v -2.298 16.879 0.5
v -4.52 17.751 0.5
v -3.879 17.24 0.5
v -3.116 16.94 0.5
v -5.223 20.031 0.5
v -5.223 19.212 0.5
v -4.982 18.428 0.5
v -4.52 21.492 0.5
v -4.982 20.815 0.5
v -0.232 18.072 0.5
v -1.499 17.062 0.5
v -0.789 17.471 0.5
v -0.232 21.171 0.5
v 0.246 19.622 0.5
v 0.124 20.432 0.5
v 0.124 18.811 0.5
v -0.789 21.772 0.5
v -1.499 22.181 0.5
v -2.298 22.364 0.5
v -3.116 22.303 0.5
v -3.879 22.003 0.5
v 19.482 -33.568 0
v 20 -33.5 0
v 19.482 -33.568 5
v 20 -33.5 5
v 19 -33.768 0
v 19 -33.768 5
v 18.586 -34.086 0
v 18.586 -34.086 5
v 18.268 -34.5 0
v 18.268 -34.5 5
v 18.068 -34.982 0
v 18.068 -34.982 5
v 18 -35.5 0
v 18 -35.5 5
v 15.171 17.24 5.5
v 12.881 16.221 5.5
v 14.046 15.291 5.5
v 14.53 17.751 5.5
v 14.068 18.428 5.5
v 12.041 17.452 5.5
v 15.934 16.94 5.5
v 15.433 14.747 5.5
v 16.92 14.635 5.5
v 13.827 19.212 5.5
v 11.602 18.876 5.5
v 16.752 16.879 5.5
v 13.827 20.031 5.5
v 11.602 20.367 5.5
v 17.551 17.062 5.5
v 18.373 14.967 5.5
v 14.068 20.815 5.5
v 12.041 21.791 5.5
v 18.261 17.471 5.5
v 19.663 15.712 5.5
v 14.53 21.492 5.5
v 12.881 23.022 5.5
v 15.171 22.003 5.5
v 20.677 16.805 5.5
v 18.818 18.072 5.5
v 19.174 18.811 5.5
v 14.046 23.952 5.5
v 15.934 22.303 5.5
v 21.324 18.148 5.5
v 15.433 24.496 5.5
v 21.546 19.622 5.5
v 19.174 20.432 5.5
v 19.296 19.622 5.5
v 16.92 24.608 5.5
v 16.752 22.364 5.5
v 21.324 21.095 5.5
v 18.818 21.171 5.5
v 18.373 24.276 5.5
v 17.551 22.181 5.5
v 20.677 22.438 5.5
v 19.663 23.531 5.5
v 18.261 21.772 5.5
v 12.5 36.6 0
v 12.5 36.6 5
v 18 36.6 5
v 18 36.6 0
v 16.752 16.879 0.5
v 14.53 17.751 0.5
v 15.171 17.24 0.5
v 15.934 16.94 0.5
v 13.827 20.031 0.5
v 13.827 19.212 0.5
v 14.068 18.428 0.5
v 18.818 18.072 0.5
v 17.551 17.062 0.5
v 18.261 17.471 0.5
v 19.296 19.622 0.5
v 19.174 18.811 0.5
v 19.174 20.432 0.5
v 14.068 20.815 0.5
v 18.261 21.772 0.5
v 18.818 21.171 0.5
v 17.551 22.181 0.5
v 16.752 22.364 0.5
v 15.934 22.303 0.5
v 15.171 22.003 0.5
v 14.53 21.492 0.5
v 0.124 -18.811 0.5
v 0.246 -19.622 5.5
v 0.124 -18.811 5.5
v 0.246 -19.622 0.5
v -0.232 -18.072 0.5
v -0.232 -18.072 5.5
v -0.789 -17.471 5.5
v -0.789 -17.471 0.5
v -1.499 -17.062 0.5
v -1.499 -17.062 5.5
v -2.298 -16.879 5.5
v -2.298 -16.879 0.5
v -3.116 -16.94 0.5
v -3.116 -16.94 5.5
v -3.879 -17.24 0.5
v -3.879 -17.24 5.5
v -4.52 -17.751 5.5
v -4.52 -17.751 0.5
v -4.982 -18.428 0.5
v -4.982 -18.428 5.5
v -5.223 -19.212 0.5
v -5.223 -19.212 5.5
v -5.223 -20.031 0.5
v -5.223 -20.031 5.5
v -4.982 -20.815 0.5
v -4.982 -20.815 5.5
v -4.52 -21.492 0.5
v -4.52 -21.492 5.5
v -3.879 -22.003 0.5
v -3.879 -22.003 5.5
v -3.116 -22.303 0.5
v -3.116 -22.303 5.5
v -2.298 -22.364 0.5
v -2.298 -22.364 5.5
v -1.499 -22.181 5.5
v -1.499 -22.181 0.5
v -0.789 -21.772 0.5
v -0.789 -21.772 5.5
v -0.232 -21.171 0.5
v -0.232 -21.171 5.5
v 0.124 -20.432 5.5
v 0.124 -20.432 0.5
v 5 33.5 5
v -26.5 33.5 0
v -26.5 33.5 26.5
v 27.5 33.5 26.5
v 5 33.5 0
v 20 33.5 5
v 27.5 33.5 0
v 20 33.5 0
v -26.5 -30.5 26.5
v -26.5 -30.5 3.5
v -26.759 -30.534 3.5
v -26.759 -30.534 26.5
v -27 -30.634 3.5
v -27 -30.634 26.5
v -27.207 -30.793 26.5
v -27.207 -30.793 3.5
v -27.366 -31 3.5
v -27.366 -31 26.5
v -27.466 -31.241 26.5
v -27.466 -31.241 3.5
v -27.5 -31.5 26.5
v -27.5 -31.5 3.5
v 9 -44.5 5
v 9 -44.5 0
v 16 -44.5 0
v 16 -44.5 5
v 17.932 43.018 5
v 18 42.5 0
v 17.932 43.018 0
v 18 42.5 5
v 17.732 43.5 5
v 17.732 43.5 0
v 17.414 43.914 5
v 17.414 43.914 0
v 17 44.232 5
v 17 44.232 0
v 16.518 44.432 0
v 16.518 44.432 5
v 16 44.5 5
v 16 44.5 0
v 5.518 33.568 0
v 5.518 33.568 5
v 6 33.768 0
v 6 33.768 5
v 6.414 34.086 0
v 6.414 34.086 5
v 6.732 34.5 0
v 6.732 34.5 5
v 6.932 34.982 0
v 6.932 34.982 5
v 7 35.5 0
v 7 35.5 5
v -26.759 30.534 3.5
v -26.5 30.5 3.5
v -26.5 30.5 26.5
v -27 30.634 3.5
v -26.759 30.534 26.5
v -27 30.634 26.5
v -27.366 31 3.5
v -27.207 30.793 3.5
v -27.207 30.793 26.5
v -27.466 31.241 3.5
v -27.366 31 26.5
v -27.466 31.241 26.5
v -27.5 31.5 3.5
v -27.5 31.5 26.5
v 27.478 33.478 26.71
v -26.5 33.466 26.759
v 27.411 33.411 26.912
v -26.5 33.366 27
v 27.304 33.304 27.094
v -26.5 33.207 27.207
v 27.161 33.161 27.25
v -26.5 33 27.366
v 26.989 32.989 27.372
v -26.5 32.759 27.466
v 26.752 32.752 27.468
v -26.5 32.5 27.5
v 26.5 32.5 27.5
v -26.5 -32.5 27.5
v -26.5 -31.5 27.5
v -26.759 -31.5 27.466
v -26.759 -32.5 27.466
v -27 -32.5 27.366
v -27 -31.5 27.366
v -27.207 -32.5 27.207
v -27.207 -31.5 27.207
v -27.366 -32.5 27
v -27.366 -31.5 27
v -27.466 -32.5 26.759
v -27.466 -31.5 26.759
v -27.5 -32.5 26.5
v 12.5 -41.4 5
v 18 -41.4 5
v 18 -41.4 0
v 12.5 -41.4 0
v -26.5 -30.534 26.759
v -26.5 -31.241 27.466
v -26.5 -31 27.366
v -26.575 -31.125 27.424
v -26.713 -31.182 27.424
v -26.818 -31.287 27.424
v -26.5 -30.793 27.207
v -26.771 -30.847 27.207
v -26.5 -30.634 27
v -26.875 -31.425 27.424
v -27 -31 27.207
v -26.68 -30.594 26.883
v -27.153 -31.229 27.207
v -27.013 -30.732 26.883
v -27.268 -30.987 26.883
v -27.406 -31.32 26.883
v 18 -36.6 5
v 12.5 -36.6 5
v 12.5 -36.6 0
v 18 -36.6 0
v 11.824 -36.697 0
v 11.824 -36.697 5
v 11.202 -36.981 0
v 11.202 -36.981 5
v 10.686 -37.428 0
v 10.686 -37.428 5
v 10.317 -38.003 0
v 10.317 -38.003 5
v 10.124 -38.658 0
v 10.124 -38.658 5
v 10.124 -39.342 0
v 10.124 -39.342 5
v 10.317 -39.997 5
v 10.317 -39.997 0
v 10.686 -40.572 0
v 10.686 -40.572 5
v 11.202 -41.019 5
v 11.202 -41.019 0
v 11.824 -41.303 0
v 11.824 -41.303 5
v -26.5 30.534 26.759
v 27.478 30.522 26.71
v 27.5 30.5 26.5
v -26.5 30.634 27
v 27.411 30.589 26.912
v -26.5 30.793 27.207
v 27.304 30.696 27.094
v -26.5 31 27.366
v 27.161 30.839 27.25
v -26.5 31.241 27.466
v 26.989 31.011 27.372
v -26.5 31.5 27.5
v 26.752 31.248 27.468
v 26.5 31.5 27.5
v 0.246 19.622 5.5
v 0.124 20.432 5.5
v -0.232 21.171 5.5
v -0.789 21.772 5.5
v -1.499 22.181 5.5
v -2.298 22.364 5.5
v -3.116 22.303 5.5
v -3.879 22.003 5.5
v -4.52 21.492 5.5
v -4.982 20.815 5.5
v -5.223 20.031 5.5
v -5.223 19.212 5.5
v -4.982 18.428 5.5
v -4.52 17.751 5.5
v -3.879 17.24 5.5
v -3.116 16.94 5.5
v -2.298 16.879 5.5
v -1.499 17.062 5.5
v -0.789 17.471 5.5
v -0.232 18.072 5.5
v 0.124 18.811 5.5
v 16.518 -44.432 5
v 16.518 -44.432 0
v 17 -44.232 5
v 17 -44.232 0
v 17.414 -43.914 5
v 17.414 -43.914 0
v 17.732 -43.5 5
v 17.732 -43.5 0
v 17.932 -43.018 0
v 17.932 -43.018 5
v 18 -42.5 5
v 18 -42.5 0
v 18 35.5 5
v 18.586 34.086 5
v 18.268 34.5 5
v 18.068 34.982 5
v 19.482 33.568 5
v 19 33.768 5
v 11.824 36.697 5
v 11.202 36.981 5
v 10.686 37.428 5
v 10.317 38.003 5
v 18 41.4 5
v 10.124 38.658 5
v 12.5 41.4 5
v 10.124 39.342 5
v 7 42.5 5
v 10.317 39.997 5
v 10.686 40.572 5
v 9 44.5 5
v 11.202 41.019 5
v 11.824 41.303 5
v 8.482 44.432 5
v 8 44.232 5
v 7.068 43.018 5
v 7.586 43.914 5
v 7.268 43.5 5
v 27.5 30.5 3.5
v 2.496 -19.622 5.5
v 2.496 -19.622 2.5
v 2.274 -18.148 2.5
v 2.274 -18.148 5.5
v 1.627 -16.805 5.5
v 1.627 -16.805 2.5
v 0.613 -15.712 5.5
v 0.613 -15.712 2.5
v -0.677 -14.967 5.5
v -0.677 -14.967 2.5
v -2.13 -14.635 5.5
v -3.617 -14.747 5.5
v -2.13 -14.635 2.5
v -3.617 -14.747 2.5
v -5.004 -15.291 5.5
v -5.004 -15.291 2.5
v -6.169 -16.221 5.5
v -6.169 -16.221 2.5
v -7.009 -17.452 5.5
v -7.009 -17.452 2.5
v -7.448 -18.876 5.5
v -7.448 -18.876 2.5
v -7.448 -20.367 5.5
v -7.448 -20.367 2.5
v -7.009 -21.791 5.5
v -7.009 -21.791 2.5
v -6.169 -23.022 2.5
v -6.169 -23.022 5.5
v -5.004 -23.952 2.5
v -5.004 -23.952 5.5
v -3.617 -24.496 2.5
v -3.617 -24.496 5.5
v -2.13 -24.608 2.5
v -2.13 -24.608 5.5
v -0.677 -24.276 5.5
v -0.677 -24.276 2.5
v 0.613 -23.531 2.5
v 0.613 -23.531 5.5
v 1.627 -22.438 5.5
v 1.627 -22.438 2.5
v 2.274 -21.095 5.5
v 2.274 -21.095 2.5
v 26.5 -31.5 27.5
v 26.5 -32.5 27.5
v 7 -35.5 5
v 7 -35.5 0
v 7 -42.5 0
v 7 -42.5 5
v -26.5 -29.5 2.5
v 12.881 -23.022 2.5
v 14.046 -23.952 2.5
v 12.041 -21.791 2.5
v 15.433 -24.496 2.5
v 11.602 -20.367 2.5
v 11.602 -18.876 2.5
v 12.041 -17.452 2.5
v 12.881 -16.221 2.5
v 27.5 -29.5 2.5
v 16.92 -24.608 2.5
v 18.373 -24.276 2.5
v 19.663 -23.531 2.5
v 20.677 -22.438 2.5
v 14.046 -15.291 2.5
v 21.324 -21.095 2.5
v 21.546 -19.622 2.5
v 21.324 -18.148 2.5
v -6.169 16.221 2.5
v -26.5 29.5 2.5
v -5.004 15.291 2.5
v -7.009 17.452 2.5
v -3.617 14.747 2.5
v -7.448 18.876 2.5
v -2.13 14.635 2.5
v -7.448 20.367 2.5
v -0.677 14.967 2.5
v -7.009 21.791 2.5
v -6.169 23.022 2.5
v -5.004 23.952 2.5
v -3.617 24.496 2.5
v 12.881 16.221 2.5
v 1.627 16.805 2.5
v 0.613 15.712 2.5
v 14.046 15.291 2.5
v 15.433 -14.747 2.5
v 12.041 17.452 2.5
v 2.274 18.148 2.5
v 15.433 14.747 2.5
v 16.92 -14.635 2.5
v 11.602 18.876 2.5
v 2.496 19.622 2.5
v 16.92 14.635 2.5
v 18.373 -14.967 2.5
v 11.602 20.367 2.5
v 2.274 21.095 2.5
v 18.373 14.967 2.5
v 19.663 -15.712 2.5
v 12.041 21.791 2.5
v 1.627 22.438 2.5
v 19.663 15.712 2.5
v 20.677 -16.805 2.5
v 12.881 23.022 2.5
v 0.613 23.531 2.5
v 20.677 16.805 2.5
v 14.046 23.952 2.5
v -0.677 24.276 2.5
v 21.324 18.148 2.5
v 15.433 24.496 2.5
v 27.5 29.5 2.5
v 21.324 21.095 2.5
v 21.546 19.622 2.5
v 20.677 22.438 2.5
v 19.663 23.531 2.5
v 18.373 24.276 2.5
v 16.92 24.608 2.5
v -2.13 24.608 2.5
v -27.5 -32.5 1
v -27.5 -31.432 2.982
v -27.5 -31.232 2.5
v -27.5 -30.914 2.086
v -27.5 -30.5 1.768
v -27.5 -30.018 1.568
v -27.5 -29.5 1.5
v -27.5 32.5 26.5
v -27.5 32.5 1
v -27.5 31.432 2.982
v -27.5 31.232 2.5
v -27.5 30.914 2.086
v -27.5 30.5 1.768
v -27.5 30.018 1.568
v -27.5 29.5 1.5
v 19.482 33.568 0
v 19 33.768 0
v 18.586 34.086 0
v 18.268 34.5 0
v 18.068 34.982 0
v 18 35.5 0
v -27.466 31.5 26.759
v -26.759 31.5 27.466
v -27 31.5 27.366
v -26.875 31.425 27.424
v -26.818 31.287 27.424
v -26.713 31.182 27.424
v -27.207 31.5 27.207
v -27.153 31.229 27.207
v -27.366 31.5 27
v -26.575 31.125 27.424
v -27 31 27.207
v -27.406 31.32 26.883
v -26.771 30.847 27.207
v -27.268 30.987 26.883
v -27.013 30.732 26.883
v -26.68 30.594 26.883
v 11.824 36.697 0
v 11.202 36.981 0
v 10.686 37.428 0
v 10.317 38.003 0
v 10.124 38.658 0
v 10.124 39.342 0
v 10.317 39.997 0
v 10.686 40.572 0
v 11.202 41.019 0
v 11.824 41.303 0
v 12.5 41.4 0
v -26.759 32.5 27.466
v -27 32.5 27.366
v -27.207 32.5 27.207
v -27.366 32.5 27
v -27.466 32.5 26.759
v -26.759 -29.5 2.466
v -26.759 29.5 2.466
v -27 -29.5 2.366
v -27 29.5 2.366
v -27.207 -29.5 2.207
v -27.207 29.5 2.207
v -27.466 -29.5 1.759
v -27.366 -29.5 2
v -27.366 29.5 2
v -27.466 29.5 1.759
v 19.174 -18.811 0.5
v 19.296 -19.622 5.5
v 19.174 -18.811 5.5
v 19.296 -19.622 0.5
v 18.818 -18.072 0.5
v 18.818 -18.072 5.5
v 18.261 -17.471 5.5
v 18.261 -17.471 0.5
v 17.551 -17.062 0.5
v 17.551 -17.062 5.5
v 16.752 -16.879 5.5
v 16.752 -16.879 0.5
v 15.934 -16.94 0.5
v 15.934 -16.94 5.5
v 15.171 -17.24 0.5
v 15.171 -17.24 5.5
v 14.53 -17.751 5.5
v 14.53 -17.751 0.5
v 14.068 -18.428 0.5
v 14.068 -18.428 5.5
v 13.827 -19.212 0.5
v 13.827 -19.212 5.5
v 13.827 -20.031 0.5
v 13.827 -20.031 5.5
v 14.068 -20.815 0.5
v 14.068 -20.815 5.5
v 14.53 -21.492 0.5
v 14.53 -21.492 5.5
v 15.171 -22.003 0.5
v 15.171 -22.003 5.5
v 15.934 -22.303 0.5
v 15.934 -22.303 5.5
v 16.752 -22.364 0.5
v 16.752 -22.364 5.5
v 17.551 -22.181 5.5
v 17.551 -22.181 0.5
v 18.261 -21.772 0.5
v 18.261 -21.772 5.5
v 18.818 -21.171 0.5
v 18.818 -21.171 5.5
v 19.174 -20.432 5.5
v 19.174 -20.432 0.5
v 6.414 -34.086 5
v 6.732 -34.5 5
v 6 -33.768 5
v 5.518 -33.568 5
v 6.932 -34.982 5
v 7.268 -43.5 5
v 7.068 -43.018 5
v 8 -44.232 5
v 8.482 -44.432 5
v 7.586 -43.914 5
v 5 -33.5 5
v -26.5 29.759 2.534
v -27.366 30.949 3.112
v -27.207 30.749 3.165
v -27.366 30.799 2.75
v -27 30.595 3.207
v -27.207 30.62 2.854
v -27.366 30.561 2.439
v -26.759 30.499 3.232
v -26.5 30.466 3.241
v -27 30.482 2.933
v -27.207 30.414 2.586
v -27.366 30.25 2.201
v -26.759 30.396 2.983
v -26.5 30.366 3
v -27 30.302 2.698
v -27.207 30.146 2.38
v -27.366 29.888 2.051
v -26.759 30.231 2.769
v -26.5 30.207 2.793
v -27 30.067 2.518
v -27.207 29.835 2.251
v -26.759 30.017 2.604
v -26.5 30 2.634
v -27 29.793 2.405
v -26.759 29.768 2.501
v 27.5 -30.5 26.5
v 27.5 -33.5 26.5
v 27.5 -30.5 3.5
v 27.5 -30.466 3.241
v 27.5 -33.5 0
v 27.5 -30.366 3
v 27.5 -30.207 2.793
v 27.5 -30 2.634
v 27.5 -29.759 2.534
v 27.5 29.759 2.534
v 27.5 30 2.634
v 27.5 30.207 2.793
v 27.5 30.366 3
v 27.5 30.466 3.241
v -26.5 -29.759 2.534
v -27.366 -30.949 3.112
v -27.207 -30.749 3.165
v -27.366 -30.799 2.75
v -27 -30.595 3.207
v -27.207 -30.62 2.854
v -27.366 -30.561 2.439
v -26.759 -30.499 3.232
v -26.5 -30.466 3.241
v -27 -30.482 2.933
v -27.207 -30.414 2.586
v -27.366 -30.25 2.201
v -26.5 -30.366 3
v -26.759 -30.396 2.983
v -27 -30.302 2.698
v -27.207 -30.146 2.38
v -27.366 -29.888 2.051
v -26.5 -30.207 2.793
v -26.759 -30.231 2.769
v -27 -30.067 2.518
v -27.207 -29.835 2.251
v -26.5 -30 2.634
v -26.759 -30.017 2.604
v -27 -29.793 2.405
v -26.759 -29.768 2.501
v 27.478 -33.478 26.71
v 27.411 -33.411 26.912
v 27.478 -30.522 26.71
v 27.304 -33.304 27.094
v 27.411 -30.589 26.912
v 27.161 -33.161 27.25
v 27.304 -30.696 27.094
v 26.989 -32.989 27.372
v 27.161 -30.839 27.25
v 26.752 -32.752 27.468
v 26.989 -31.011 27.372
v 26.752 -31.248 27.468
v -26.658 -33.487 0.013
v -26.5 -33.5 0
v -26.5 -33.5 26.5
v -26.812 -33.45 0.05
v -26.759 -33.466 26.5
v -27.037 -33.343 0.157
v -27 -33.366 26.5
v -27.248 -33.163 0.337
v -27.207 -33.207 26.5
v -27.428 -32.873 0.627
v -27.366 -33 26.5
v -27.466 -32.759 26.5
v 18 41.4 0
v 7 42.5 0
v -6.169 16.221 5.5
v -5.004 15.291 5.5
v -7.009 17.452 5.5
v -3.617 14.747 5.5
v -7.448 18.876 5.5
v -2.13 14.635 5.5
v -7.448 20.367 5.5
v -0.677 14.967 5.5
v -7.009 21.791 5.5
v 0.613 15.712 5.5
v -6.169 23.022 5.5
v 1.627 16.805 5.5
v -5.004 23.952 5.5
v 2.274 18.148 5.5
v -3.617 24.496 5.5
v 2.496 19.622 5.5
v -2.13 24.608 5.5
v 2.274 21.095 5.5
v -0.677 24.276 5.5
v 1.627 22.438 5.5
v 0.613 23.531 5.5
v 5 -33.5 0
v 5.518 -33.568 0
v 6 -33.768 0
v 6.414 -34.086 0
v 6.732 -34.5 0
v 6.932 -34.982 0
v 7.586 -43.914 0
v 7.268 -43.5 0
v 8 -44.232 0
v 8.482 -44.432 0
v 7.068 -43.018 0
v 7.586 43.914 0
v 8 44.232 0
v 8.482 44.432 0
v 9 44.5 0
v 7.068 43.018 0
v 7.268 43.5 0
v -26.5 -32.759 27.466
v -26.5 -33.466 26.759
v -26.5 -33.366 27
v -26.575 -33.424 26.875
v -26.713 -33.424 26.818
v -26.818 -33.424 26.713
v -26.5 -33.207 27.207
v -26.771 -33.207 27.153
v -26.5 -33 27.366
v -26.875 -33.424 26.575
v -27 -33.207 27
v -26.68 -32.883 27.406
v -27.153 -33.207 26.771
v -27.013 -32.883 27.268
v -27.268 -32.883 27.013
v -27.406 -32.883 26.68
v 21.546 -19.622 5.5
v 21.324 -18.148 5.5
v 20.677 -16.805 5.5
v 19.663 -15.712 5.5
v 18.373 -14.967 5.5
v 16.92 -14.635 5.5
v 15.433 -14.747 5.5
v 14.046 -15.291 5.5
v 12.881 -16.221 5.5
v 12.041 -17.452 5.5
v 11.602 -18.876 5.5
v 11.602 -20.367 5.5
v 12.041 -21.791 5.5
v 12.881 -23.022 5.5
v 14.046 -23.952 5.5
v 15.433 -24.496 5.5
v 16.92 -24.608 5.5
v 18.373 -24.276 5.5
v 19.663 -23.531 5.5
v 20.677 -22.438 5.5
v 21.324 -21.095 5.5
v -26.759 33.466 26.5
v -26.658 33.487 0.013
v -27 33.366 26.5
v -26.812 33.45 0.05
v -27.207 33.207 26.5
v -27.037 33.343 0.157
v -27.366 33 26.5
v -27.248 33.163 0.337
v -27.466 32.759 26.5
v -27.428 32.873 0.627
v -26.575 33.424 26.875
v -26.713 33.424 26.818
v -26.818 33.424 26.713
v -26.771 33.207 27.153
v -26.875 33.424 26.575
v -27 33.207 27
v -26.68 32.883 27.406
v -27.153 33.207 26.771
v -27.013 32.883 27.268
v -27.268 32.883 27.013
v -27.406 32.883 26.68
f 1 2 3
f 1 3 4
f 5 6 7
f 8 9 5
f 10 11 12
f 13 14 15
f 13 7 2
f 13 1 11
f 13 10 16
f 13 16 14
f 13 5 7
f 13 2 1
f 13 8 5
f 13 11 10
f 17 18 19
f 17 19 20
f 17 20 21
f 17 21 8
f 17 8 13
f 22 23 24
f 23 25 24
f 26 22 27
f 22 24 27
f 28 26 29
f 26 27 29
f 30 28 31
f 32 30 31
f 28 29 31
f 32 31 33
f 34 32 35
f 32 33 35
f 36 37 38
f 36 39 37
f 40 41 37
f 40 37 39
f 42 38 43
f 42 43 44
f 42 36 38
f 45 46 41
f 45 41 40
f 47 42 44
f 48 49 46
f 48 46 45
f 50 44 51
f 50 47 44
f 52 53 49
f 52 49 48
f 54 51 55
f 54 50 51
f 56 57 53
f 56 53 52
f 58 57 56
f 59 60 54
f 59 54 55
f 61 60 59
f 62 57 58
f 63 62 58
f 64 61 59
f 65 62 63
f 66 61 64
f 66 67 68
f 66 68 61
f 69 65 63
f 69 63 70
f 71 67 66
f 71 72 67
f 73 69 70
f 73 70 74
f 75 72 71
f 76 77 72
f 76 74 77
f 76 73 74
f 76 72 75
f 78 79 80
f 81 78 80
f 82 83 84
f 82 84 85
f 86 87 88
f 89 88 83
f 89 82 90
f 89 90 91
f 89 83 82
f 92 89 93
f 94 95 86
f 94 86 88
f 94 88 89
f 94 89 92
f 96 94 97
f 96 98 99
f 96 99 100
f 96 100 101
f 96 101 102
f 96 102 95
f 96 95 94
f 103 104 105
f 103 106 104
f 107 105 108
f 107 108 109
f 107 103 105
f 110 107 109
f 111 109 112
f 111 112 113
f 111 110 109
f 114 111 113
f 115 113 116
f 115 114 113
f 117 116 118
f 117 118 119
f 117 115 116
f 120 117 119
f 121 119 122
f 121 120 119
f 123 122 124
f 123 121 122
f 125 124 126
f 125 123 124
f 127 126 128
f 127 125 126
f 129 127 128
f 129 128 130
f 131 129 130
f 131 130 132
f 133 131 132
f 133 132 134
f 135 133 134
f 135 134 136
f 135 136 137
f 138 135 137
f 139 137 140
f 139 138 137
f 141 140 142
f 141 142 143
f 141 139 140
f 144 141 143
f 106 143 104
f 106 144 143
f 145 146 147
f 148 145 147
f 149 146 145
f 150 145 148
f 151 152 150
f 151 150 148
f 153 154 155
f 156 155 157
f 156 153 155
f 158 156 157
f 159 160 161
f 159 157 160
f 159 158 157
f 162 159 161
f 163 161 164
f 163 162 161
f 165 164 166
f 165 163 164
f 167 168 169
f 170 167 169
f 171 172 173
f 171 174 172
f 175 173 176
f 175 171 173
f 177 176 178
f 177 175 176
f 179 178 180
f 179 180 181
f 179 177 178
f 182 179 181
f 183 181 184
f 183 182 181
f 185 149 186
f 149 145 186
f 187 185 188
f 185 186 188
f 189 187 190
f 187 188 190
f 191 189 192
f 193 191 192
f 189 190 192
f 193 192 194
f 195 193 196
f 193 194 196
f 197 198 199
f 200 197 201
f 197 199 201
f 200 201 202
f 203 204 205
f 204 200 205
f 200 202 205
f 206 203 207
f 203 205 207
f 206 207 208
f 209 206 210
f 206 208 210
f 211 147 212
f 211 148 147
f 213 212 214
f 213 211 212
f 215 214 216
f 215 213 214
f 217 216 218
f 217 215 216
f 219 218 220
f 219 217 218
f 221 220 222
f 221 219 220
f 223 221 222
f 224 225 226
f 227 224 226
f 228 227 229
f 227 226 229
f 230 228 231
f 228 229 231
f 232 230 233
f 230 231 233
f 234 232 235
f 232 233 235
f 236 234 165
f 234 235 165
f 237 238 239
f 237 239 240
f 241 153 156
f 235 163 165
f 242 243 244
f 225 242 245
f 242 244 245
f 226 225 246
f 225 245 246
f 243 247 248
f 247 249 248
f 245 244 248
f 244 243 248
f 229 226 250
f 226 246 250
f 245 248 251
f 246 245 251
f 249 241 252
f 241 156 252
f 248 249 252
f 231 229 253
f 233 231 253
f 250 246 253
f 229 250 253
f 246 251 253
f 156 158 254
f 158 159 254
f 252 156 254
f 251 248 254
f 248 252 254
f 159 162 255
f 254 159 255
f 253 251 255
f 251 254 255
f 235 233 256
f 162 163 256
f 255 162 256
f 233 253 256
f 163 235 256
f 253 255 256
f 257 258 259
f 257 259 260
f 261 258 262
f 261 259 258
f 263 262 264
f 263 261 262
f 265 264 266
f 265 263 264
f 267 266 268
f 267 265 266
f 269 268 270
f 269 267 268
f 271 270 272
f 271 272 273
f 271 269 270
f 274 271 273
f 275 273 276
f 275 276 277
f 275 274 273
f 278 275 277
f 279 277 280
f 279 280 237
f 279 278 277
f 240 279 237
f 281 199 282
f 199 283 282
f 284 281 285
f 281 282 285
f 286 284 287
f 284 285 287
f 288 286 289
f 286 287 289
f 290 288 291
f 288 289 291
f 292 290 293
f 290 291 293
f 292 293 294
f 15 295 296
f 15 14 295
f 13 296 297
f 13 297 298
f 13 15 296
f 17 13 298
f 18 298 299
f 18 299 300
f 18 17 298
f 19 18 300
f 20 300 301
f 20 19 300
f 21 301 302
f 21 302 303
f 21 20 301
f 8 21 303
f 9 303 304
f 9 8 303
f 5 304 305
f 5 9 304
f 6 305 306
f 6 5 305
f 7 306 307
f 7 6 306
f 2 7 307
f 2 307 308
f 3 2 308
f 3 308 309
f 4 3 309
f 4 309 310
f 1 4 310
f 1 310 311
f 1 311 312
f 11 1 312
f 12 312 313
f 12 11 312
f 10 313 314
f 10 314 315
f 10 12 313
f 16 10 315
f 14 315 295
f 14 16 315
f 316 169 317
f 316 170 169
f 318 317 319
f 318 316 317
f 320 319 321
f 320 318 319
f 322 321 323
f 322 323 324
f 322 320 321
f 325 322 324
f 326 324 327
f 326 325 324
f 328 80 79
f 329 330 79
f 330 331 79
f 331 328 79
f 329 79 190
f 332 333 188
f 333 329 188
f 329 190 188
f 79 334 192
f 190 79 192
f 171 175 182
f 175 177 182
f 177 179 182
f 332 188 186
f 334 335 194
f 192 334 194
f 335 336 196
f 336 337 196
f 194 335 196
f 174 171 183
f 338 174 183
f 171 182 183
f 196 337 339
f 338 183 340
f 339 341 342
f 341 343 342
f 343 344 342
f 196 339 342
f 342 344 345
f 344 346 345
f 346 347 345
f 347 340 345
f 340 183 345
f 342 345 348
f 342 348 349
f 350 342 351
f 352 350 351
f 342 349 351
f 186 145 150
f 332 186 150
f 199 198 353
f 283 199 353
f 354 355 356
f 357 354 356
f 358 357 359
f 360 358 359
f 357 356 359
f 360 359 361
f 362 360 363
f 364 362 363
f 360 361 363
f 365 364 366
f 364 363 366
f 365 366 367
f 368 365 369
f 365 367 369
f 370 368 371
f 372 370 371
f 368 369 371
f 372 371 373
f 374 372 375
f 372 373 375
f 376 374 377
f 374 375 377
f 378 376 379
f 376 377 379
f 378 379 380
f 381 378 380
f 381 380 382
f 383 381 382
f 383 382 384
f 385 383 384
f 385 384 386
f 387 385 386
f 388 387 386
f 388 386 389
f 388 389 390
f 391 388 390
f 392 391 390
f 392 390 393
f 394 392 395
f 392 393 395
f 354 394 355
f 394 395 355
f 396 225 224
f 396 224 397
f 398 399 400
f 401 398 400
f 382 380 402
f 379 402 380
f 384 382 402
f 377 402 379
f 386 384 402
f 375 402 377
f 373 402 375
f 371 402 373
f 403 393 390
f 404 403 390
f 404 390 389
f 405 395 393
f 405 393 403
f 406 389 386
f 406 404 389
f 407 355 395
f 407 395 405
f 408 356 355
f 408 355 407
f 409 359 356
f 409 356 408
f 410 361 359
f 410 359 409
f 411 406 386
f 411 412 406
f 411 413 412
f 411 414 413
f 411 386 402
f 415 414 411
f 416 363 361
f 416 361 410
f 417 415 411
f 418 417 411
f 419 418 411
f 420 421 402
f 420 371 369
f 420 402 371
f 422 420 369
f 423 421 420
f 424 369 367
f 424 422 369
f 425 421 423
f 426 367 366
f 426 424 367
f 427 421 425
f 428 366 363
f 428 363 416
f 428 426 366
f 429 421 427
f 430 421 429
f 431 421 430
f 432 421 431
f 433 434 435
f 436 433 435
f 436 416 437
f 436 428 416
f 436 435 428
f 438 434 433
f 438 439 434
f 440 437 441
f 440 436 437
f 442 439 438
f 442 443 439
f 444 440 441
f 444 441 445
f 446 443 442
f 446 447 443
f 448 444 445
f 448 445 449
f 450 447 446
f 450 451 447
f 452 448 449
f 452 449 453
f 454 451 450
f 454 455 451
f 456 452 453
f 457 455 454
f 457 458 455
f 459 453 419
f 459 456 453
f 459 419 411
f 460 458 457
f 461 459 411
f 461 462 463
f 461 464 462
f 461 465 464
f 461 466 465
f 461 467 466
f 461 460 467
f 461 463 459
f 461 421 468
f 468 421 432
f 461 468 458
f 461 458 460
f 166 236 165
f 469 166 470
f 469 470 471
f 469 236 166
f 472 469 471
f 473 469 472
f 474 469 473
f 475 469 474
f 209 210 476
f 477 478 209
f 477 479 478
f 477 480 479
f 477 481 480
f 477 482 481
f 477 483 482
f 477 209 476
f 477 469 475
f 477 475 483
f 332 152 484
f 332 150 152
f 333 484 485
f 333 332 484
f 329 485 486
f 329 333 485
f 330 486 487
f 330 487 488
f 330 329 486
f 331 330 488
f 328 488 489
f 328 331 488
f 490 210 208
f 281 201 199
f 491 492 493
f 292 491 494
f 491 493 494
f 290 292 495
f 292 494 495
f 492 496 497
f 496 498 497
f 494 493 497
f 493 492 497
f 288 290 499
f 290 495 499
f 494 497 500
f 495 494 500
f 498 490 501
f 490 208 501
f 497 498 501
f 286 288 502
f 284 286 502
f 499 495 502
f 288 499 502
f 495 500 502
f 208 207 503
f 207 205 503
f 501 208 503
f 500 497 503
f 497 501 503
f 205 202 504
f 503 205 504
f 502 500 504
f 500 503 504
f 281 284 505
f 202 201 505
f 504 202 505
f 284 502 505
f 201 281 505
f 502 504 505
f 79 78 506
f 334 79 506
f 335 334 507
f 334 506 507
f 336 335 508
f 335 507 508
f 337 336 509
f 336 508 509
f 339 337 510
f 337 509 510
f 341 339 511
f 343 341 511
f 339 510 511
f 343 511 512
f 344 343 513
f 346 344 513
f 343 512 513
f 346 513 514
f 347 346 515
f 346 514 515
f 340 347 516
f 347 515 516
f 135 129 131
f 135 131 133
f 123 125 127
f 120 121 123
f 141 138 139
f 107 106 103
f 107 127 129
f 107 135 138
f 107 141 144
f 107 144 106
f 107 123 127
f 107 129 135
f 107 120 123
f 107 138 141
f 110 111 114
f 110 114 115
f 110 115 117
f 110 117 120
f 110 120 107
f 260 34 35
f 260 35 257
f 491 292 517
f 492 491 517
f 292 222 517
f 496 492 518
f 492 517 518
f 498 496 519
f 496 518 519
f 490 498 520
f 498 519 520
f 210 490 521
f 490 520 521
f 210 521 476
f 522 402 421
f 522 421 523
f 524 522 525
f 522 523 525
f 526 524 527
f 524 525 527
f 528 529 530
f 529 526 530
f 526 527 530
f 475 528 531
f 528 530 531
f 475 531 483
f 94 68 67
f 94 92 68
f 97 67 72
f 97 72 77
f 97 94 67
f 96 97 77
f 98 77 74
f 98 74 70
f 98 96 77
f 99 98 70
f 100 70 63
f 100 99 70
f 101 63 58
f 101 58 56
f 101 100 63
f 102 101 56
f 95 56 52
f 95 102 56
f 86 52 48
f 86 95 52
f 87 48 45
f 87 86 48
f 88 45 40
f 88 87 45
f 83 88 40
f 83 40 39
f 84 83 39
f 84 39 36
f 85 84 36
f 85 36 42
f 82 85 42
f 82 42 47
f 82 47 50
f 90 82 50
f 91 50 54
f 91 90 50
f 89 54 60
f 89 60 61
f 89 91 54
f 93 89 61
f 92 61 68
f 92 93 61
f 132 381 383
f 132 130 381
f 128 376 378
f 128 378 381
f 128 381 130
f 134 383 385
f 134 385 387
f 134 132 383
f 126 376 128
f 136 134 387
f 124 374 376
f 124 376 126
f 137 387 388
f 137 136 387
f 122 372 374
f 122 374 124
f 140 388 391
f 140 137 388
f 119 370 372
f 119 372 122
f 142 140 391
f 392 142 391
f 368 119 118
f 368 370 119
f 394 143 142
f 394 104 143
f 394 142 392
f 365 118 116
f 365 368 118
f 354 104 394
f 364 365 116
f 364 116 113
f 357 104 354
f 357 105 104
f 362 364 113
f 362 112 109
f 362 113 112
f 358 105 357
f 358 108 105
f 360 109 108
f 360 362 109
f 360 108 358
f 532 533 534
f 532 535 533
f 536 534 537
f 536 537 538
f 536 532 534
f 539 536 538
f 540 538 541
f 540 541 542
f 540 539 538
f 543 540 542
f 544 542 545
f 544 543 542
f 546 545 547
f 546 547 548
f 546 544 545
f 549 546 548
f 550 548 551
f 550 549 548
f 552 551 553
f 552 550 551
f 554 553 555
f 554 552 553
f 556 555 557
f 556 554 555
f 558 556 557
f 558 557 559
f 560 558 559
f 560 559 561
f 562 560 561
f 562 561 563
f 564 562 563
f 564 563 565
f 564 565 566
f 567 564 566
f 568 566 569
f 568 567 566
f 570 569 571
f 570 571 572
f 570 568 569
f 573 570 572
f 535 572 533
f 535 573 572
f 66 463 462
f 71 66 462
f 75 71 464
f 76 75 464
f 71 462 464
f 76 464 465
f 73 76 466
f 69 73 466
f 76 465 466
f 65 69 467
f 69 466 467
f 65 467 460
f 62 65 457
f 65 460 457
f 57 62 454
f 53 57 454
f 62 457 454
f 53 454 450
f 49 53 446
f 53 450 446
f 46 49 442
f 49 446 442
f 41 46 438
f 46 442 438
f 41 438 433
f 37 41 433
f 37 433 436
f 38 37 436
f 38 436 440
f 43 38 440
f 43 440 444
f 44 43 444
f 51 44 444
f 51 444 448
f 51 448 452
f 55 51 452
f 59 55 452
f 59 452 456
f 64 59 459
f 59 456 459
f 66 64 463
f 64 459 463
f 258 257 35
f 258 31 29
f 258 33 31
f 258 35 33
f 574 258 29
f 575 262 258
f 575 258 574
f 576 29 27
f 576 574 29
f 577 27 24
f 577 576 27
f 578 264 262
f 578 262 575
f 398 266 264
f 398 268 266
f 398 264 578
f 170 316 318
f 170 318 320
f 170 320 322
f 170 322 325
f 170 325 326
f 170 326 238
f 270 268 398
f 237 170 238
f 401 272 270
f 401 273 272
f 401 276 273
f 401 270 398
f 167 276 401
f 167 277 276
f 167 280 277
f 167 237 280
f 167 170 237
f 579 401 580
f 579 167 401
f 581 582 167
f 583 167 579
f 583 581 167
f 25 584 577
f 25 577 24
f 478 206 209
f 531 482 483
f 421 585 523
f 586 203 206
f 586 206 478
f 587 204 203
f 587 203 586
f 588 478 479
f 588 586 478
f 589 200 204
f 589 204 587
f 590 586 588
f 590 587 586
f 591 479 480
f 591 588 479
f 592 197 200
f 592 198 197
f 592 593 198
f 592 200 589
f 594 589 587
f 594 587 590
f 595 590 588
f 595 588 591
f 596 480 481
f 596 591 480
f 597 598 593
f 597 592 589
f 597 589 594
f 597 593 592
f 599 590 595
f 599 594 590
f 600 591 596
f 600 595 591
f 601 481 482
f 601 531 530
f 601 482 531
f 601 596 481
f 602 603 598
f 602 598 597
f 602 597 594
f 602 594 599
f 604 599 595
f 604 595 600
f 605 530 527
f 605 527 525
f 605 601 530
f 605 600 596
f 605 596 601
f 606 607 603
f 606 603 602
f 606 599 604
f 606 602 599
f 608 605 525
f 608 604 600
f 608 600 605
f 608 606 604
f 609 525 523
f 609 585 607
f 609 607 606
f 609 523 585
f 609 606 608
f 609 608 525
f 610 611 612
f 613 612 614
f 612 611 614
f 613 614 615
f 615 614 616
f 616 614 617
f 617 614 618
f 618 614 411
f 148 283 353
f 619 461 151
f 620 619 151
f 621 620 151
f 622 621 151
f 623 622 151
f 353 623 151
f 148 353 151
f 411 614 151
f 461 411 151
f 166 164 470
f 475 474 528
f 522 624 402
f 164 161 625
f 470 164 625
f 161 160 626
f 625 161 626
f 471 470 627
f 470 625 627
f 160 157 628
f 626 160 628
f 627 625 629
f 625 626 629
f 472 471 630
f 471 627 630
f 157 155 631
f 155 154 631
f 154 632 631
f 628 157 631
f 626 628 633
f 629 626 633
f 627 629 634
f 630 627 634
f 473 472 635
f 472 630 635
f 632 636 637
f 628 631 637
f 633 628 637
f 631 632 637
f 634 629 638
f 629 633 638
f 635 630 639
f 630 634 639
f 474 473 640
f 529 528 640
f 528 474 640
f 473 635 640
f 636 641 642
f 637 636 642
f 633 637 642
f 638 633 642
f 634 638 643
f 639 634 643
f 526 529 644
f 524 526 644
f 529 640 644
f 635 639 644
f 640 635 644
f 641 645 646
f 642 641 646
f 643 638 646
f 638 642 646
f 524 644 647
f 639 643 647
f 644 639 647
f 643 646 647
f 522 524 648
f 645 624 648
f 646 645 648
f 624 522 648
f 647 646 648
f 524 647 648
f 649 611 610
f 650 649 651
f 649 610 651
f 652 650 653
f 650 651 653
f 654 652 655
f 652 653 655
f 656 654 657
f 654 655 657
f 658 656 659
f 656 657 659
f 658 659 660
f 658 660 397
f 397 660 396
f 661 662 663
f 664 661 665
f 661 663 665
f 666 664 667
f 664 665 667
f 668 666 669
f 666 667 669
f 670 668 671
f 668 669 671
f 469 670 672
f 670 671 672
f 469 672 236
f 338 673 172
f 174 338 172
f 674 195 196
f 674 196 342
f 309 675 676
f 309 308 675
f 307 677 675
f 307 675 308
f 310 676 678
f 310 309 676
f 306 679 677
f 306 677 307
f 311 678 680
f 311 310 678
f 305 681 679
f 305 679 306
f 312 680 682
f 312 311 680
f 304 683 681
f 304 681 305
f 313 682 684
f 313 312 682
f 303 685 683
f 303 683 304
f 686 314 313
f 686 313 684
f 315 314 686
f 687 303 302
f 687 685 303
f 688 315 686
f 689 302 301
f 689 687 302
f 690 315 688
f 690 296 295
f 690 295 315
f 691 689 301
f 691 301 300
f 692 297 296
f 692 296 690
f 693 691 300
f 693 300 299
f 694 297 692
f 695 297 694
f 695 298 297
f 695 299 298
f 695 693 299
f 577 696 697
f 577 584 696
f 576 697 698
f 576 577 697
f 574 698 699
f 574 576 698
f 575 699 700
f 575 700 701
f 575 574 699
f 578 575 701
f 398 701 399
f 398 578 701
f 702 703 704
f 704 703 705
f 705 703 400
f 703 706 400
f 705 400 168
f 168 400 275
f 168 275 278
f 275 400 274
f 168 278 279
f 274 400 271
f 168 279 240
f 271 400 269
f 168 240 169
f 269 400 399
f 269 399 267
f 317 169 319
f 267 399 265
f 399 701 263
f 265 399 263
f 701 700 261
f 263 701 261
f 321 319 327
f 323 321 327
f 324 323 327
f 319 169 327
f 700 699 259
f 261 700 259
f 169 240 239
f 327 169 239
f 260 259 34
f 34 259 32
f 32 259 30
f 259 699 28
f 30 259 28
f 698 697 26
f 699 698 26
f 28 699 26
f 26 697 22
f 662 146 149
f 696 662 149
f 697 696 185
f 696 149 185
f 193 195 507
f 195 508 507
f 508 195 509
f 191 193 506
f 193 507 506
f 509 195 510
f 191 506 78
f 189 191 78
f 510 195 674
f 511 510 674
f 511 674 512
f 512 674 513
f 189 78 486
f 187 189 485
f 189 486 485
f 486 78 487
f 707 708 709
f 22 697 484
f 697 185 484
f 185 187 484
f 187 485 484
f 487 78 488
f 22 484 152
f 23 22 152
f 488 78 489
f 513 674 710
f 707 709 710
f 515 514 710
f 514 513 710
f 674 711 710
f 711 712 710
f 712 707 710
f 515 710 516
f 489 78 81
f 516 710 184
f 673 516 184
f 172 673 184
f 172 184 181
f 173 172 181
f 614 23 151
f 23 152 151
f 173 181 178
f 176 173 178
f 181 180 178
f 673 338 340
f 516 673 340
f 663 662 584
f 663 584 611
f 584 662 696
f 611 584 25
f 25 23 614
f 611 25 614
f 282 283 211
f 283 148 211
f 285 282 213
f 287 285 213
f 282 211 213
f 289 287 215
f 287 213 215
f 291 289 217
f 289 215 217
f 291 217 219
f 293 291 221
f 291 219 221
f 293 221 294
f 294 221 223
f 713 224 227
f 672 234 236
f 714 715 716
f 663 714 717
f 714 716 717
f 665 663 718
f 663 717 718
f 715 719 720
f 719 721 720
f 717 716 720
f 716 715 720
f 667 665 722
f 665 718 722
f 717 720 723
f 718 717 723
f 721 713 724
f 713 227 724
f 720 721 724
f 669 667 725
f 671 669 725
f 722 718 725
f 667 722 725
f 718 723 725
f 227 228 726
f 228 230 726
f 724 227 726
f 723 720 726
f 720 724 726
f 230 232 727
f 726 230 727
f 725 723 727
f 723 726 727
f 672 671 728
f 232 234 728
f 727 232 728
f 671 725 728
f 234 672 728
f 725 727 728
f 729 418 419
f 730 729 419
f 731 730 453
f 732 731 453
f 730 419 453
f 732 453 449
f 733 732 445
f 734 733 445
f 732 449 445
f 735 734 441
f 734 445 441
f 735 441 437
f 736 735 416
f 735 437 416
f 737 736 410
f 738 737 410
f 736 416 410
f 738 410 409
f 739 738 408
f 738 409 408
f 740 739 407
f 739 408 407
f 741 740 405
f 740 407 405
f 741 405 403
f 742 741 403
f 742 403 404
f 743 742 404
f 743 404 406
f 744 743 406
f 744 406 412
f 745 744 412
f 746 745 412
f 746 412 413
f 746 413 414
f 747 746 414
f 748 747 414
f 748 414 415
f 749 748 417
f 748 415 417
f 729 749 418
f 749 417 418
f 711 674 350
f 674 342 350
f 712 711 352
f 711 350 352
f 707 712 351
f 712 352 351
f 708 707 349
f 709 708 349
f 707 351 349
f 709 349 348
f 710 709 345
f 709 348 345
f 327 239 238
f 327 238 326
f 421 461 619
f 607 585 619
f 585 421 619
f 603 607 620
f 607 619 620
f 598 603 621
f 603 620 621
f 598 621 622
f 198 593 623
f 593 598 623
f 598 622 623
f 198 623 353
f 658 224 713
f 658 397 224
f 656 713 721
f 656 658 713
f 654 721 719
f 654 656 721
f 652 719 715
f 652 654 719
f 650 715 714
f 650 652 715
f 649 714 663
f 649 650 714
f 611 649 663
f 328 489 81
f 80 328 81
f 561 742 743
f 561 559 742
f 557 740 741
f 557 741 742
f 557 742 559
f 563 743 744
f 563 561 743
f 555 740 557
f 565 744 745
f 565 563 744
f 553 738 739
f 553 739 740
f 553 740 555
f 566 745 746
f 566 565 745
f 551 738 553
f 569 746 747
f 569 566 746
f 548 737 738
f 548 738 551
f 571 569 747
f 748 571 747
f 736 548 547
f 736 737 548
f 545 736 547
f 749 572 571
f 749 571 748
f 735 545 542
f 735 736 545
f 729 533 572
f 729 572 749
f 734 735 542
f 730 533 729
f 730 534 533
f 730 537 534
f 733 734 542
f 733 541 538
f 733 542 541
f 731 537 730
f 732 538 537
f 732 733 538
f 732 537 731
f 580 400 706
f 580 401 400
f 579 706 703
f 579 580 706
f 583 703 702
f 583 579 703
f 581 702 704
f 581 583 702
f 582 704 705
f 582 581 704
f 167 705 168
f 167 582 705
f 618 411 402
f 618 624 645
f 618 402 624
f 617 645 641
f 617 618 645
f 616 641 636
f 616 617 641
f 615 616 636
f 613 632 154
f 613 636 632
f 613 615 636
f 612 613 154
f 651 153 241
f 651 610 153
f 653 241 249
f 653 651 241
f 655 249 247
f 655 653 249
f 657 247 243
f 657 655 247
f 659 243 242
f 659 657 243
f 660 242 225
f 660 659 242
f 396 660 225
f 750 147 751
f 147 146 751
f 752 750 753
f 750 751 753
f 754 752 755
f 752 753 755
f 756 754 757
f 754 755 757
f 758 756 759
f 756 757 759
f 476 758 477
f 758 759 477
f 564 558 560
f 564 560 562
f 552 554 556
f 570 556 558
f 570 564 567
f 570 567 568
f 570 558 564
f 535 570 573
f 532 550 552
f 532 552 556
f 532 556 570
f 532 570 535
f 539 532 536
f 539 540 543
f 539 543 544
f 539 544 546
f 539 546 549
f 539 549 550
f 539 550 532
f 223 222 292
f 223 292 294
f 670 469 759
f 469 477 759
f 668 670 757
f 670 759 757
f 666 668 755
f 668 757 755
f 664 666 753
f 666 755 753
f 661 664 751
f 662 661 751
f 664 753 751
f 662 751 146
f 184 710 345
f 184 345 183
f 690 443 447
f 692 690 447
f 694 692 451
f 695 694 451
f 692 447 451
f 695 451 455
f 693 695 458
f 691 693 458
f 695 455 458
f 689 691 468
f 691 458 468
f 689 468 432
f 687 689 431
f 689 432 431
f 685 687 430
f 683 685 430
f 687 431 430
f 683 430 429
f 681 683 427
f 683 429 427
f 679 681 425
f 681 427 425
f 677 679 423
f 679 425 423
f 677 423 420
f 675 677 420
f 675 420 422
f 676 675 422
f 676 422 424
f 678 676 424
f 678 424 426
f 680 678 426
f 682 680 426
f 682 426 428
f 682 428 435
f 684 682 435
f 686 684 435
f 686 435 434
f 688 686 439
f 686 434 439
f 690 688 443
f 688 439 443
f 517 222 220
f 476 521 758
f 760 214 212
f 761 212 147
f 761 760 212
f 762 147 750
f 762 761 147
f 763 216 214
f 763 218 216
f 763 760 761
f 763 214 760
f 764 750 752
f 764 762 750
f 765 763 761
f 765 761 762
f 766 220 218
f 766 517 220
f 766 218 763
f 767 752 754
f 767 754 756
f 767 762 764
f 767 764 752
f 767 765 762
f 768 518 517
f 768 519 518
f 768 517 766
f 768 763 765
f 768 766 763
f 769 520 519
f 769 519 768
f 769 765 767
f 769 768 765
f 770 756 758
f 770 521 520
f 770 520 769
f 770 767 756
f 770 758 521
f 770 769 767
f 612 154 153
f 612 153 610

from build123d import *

# Parameters (mm, degrees)
SKETCH1_W            = 55
SKETCH1_H            = 67
BOSS_EXTRUDE1_DEPTH  = 2.5
SKETCH2_W            = 55
SKETCH2_H            = 3
BOSS_EXTRUDE2_DEPTH  = 25
SKETCH3_R            = 5
SKETCH3_R_2          = 2.75
BOSS_EXTRUDE3_DEPTH  = 3
CUT_EXTRUDE1_START   = -2
SKETCH4_R            = 2.75
CUT_EXTRUDE1_DEPTH   = 2
SKETCH5_W            = 5.5
SKETCH5_H            = 11
BOSS_EXTRUDE4_DEPTH  = 5
M4_CLEARANCE_HOLE1_D = 4.8
FILLET3_R            = 2
FILLET4_R            = 1
CUT_EXTRUDE3_DEPTH   = 57.945149047


with BuildPart() as part:
    # Sketch1 → Boss-Extrude1 (new body)
    with BuildSketch(Plane.XY):
        Rectangle(SKETCH1_W, SKETCH1_H)
    extrude(amount=BOSS_EXTRUDE1_DEPTH)

    # Sketch2 → Boss-Extrude2 (add)
    with BuildSketch(Plane.XY.offset(2.5)):
        with Locations((0, 32)):
            Rectangle(SKETCH2_W, SKETCH2_H)
        with Locations((0, -32)):
            Rectangle(SKETCH2_W, SKETCH2_H)
    extrude(amount=BOSS_EXTRUDE2_DEPTH)

    # Sketch3 → Boss-Extrude3 (add)
    # profile 1 of 4: a face of its own
    with BuildSketch(Plane.XY.offset(2.5)):
        with Locations((-2.504, 19.6215)):
            Circle(SKETCH3_R)
        with Locations((-2.504, 19.6215)):
            Circle(SKETCH3_R_2, mode=Mode.SUBTRACT)
    # profile 2 of 4: a face of its own
    with BuildSketch(Plane.XY.offset(2.5)):
        with Locations((16.546, 19.6215)):
            Circle(SKETCH3_R)
        with Locations((16.546, 19.6215)):
            Circle(SKETCH3_R_2, mode=Mode.SUBTRACT)
    # profile 3 of 4: a face of its own
    with BuildSketch(Plane.XY.offset(2.5)):
        with Locations((16.546, -19.6215)):
            Circle(SKETCH3_R)
        with Locations((16.546, -19.6215)):
            Circle(SKETCH3_R_2, mode=Mode.SUBTRACT)
    # profile 4 of 4: a face of its own
    with BuildSketch(Plane.XY.offset(2.5)):
        with Locations((-2.504, -19.6215)):
            Circle(SKETCH3_R)
        with Locations((-2.504, -19.6215)):
            Circle(SKETCH3_R_2, mode=Mode.SUBTRACT)
    extrude(amount=BOSS_EXTRUDE3_DEPTH)

    # Sketch4 → Cut-Extrude1 (cut)
    with BuildSketch(Plane.XY.offset(2.5).offset(CUT_EXTRUDE1_START)):
        with Locations((16.546, -19.6215)):
            Circle(SKETCH4_R)
        with Locations((-2.504, -19.6215)):
            Circle(SKETCH4_R)
        with Locations((16.546, 19.6215)):
            Circle(SKETCH4_R)
        with Locations((-2.504, 19.6215)):
            Circle(SKETCH4_R)
    extrude(amount=CUT_EXTRUDE1_DEPTH, mode=Mode.SUBTRACT)

    # Sketch5 → Boss-Extrude4 (add)
    with BuildSketch(Plane(origin=(0, 0, 0), x_dir=(-1, 0, 0), z_dir=(0, 0, -1))):
        with Locations((-9.75, 39)):
            Rectangle(SKETCH5_W, SKETCH5_H)
        with Locations((-15.25, 39)):
            Rectangle(SKETCH5_W, SKETCH5_H)
    boss_extrude4 = extrude(amount=-BOSS_EXTRUDE4_DEPTH)

    # M4 Clearance Hole1 (through all)
    with Locations(Plane.XY.offset(5)):
        with Locations((12.5, 39)):
            m4_clearance_hole1 = Hole(M4_CLEARANCE_HOLE1_D / 2)

    # Mirror2: Boss-Extrude4, M4 Clearance Hole1 across plane
    add(boss_extrude4.mirror(Plane.ZX))
    add(m4_clearance_hole1.mirror(Plane.ZX), mode=Mode.SUBTRACT)

    # Fillet3
    fillet3_edges = [part.edges().sort_by_distance(p)[0] for p in [
        (7, -44.5, 2.5),
        (18, -44.5, 2.5),
        (18, -33.5, 2.5),
        (7, -33.5, 2.5),
        (18, 44.5, 2.5),
        (7, 44.5, 2.5),
        (7, 33.5, 2.5),
        (18, 33.5, 2.5),
    ]]
    fillet(fillet3_edges, radius=FILLET3_R)

    # Fillet4
    fillet4_edges = [part.edges().sort_by_distance(p)[0] for p in [
        (-27.5, 0, 2.5),
        (0, 30.5, 2.5),
        (-27.5, 30.5, 15),
        (-27.5, 32, 27.5),
        (0, 30.5, 27.5),
        (27.5, 32, 27.5),
        (0, 33.5, 27.5),
        (0, -30.5, 2.5),
        (-27.5, -30.5, 15),
        (27.5, -32, 27.5),
        (0, -30.5, 27.5),
        (-27.5, -32, 27.5),
        (0, -33.5, 27.5),
        (-27.5, 0, 0),
        (-27.5, -33.5, 13.75),
        (-27.5, 33.5, 13.75),
    ]]
    fillet(fillet4_edges, radius=FILLET4_R)

    # Sketch10 → Cut-Extrude3 (cut, through all)
    with BuildSketch(Plane.XY.offset(5)):
        with BuildLine():
            Line((18, 41.4), (12.5, 41.4))
            ThreePointArc((12.5, 41.4), (14.197056275, 40.697056275), (14.9, 39))
            ThreePointArc((14.9, 39), (14.197056275, 37.302943725), (12.5, 36.6))
            Line((12.5, 36.6), (18, 36.6))
            Line((18, 36.6), (18, 41.4))
        make_face()
    cut_extrude3 = extrude(amount=-CUT_EXTRUDE3_DEPTH, mode=Mode.SUBTRACT)

    # Mirror3: Cut-Extrude3 across plane
    add(cut_extrude3.mirror(Plane.ZX), mode=Mode.SUBTRACT)


solid = part.part
